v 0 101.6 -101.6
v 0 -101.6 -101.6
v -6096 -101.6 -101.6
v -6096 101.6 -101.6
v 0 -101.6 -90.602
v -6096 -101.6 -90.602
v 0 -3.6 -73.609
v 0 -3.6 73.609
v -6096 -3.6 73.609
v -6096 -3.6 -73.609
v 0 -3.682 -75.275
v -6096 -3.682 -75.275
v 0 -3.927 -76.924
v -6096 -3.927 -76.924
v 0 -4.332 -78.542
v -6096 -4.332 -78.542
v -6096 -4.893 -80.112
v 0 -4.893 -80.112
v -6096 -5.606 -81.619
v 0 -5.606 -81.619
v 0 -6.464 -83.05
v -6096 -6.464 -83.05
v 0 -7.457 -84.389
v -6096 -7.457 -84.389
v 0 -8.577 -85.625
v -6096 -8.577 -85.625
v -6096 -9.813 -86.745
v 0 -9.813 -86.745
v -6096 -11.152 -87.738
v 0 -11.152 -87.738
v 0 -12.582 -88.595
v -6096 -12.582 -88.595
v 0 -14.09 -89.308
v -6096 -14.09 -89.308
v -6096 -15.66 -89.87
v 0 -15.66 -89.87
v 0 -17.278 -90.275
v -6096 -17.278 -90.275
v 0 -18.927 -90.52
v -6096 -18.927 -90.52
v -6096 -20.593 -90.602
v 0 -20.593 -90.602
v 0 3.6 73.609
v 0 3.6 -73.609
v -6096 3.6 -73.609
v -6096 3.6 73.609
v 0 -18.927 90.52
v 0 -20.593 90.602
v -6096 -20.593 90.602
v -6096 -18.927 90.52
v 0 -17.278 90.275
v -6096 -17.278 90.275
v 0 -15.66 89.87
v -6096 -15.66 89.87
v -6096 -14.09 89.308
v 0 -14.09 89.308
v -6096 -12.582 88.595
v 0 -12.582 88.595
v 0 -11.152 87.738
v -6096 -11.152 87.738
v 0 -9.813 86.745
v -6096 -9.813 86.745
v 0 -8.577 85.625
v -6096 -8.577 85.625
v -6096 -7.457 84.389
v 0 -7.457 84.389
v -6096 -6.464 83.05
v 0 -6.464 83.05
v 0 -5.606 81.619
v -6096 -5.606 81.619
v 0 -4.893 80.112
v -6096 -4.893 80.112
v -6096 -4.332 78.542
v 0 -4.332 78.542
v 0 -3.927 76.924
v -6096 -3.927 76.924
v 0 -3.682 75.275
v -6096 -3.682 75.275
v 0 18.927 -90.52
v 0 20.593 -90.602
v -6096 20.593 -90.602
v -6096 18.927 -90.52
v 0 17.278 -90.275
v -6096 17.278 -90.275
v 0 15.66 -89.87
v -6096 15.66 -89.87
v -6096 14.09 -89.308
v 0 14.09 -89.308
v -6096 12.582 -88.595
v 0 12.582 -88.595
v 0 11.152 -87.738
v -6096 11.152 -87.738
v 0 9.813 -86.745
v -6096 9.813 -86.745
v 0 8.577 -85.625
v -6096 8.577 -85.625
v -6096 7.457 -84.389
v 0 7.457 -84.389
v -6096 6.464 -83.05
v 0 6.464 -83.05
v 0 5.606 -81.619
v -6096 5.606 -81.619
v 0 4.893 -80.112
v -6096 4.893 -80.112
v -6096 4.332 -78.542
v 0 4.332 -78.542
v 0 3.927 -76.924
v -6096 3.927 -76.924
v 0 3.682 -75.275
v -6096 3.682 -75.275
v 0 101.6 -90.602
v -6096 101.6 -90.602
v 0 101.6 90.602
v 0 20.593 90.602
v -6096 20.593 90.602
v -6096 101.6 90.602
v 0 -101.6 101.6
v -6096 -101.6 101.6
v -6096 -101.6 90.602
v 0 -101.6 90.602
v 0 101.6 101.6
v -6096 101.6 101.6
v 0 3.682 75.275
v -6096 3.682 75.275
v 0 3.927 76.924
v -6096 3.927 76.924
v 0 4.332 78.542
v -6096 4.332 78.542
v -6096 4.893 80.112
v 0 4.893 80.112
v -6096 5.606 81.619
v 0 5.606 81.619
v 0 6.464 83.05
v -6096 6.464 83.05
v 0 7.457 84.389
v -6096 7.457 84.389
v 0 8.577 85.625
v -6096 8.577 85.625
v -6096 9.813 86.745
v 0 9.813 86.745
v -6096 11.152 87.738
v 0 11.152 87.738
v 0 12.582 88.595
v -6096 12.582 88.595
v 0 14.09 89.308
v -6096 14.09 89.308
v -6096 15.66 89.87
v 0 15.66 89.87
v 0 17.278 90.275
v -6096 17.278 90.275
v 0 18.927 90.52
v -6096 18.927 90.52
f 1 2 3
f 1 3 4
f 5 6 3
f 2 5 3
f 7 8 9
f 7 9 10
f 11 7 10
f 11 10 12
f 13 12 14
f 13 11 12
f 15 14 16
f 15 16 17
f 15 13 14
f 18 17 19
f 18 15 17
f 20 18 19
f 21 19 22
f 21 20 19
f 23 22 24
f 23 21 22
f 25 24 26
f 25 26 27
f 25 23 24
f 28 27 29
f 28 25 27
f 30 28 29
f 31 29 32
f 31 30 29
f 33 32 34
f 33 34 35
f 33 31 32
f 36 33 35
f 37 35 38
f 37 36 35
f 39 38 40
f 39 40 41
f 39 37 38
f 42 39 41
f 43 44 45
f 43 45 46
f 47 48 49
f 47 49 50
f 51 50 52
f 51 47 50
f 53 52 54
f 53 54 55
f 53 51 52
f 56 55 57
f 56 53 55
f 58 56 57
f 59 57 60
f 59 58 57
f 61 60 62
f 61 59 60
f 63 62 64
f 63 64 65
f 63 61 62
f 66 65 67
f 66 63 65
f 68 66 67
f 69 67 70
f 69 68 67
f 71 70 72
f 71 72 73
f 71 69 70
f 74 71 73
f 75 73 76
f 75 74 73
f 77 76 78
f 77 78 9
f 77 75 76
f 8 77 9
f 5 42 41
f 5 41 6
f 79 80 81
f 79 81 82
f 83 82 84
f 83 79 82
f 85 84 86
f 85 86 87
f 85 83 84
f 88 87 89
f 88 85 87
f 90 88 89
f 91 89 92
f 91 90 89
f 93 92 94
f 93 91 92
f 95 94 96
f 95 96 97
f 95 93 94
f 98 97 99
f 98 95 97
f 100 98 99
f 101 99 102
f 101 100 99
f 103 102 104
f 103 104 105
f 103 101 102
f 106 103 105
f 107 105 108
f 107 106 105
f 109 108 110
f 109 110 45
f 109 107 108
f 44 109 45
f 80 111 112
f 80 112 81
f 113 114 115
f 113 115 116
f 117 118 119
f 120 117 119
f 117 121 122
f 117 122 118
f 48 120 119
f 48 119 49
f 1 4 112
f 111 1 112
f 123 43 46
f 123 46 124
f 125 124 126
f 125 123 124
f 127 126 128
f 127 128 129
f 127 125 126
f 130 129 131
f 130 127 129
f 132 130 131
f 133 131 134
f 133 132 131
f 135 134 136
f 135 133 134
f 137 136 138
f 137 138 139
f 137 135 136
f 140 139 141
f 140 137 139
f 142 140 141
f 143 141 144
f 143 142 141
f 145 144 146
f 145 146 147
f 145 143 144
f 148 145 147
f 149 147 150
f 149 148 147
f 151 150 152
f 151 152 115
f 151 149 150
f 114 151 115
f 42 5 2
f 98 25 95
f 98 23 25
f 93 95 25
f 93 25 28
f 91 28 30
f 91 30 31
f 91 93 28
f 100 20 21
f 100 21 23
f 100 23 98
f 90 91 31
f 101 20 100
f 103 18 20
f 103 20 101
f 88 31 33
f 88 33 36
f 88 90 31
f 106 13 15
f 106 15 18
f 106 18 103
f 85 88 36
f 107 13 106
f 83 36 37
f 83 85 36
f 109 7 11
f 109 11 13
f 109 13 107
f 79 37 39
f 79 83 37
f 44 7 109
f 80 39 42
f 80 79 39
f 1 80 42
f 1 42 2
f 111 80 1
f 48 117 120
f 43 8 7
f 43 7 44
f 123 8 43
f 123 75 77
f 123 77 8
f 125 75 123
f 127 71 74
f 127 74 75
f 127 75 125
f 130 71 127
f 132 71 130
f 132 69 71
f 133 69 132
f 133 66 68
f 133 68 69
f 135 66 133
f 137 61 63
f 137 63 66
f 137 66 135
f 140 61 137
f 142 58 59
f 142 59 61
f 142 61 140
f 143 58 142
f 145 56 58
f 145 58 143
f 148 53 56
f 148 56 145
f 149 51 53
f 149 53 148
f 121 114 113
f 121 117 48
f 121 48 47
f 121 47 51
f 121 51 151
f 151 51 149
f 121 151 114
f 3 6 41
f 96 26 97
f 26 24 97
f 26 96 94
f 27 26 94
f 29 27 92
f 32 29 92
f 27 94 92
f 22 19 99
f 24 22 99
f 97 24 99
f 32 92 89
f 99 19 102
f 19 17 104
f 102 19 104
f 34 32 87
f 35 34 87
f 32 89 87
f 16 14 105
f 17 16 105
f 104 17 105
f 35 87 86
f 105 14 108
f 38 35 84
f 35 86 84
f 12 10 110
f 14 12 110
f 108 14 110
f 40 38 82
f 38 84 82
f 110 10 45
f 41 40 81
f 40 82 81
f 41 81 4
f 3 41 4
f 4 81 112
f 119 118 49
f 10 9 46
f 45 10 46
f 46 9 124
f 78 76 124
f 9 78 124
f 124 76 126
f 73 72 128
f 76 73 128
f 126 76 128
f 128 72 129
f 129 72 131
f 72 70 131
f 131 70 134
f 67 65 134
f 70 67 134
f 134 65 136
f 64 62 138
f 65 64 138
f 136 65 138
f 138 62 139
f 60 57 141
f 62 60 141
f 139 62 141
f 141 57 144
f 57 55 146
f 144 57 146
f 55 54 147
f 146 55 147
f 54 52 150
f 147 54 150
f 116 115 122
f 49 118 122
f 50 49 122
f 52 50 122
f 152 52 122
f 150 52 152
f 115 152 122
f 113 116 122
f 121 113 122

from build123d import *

# Parameters (mm, degrees)
F1_DEPTH = 6096


with BuildPart() as f1:
    # F0 (on Right) → F1 (new body)
    with BuildSketch(Plane.YZ):
        with BuildLine():
            Line((-3.6, 73.6092), (-3.6, 0))
            Line((-3.6, 0), (-3.6, -73.6092))
            ThreePointArc((-3.6, -73.6092), (-8.577017, -85.624783), (-20.5926, -90.6018))
            Line((-20.5926, -90.6018), (-101.6, -90.6018))
            Line((-101.6, -90.6018), (-101.6, -101.6))
            Line((-101.6, -101.6), (0, -101.6))
            Line((0, -101.6), (101.6, -101.6))
            Line((101.6, -101.6), (101.6, -90.6018))
            Line((101.6, -90.6018), (20.5926, -90.6018))
            ThreePointArc((20.5926, -90.6018), (8.577017, -85.624783), (3.6, -73.6092))
            Line((3.6, -73.6092), (3.6, 0))
            Line((3.6, 0), (3.6, 73.6092))
            ThreePointArc((3.6, 73.6092), (8.577017, 85.624783), (20.5926, 90.6018))
            Line((20.5926, 90.6018), (101.6, 90.6018))
            Line((101.6, 90.6018), (101.6, 101.6))
            Line((101.6, 101.6), (0, 101.6))
            Line((0, 101.6), (-101.6, 101.6))
            Line((-101.6, 101.6), (-101.6, 90.6018))
            Line((-101.6, 90.6018), (-20.5926, 90.6018))
            ThreePointArc((-20.5926, 90.6018), (-8.577017, 85.624783), (-3.6, 73.6092))
        make_face()
    extrude(amount=-F1_DEPTH)


solid = f1.part
